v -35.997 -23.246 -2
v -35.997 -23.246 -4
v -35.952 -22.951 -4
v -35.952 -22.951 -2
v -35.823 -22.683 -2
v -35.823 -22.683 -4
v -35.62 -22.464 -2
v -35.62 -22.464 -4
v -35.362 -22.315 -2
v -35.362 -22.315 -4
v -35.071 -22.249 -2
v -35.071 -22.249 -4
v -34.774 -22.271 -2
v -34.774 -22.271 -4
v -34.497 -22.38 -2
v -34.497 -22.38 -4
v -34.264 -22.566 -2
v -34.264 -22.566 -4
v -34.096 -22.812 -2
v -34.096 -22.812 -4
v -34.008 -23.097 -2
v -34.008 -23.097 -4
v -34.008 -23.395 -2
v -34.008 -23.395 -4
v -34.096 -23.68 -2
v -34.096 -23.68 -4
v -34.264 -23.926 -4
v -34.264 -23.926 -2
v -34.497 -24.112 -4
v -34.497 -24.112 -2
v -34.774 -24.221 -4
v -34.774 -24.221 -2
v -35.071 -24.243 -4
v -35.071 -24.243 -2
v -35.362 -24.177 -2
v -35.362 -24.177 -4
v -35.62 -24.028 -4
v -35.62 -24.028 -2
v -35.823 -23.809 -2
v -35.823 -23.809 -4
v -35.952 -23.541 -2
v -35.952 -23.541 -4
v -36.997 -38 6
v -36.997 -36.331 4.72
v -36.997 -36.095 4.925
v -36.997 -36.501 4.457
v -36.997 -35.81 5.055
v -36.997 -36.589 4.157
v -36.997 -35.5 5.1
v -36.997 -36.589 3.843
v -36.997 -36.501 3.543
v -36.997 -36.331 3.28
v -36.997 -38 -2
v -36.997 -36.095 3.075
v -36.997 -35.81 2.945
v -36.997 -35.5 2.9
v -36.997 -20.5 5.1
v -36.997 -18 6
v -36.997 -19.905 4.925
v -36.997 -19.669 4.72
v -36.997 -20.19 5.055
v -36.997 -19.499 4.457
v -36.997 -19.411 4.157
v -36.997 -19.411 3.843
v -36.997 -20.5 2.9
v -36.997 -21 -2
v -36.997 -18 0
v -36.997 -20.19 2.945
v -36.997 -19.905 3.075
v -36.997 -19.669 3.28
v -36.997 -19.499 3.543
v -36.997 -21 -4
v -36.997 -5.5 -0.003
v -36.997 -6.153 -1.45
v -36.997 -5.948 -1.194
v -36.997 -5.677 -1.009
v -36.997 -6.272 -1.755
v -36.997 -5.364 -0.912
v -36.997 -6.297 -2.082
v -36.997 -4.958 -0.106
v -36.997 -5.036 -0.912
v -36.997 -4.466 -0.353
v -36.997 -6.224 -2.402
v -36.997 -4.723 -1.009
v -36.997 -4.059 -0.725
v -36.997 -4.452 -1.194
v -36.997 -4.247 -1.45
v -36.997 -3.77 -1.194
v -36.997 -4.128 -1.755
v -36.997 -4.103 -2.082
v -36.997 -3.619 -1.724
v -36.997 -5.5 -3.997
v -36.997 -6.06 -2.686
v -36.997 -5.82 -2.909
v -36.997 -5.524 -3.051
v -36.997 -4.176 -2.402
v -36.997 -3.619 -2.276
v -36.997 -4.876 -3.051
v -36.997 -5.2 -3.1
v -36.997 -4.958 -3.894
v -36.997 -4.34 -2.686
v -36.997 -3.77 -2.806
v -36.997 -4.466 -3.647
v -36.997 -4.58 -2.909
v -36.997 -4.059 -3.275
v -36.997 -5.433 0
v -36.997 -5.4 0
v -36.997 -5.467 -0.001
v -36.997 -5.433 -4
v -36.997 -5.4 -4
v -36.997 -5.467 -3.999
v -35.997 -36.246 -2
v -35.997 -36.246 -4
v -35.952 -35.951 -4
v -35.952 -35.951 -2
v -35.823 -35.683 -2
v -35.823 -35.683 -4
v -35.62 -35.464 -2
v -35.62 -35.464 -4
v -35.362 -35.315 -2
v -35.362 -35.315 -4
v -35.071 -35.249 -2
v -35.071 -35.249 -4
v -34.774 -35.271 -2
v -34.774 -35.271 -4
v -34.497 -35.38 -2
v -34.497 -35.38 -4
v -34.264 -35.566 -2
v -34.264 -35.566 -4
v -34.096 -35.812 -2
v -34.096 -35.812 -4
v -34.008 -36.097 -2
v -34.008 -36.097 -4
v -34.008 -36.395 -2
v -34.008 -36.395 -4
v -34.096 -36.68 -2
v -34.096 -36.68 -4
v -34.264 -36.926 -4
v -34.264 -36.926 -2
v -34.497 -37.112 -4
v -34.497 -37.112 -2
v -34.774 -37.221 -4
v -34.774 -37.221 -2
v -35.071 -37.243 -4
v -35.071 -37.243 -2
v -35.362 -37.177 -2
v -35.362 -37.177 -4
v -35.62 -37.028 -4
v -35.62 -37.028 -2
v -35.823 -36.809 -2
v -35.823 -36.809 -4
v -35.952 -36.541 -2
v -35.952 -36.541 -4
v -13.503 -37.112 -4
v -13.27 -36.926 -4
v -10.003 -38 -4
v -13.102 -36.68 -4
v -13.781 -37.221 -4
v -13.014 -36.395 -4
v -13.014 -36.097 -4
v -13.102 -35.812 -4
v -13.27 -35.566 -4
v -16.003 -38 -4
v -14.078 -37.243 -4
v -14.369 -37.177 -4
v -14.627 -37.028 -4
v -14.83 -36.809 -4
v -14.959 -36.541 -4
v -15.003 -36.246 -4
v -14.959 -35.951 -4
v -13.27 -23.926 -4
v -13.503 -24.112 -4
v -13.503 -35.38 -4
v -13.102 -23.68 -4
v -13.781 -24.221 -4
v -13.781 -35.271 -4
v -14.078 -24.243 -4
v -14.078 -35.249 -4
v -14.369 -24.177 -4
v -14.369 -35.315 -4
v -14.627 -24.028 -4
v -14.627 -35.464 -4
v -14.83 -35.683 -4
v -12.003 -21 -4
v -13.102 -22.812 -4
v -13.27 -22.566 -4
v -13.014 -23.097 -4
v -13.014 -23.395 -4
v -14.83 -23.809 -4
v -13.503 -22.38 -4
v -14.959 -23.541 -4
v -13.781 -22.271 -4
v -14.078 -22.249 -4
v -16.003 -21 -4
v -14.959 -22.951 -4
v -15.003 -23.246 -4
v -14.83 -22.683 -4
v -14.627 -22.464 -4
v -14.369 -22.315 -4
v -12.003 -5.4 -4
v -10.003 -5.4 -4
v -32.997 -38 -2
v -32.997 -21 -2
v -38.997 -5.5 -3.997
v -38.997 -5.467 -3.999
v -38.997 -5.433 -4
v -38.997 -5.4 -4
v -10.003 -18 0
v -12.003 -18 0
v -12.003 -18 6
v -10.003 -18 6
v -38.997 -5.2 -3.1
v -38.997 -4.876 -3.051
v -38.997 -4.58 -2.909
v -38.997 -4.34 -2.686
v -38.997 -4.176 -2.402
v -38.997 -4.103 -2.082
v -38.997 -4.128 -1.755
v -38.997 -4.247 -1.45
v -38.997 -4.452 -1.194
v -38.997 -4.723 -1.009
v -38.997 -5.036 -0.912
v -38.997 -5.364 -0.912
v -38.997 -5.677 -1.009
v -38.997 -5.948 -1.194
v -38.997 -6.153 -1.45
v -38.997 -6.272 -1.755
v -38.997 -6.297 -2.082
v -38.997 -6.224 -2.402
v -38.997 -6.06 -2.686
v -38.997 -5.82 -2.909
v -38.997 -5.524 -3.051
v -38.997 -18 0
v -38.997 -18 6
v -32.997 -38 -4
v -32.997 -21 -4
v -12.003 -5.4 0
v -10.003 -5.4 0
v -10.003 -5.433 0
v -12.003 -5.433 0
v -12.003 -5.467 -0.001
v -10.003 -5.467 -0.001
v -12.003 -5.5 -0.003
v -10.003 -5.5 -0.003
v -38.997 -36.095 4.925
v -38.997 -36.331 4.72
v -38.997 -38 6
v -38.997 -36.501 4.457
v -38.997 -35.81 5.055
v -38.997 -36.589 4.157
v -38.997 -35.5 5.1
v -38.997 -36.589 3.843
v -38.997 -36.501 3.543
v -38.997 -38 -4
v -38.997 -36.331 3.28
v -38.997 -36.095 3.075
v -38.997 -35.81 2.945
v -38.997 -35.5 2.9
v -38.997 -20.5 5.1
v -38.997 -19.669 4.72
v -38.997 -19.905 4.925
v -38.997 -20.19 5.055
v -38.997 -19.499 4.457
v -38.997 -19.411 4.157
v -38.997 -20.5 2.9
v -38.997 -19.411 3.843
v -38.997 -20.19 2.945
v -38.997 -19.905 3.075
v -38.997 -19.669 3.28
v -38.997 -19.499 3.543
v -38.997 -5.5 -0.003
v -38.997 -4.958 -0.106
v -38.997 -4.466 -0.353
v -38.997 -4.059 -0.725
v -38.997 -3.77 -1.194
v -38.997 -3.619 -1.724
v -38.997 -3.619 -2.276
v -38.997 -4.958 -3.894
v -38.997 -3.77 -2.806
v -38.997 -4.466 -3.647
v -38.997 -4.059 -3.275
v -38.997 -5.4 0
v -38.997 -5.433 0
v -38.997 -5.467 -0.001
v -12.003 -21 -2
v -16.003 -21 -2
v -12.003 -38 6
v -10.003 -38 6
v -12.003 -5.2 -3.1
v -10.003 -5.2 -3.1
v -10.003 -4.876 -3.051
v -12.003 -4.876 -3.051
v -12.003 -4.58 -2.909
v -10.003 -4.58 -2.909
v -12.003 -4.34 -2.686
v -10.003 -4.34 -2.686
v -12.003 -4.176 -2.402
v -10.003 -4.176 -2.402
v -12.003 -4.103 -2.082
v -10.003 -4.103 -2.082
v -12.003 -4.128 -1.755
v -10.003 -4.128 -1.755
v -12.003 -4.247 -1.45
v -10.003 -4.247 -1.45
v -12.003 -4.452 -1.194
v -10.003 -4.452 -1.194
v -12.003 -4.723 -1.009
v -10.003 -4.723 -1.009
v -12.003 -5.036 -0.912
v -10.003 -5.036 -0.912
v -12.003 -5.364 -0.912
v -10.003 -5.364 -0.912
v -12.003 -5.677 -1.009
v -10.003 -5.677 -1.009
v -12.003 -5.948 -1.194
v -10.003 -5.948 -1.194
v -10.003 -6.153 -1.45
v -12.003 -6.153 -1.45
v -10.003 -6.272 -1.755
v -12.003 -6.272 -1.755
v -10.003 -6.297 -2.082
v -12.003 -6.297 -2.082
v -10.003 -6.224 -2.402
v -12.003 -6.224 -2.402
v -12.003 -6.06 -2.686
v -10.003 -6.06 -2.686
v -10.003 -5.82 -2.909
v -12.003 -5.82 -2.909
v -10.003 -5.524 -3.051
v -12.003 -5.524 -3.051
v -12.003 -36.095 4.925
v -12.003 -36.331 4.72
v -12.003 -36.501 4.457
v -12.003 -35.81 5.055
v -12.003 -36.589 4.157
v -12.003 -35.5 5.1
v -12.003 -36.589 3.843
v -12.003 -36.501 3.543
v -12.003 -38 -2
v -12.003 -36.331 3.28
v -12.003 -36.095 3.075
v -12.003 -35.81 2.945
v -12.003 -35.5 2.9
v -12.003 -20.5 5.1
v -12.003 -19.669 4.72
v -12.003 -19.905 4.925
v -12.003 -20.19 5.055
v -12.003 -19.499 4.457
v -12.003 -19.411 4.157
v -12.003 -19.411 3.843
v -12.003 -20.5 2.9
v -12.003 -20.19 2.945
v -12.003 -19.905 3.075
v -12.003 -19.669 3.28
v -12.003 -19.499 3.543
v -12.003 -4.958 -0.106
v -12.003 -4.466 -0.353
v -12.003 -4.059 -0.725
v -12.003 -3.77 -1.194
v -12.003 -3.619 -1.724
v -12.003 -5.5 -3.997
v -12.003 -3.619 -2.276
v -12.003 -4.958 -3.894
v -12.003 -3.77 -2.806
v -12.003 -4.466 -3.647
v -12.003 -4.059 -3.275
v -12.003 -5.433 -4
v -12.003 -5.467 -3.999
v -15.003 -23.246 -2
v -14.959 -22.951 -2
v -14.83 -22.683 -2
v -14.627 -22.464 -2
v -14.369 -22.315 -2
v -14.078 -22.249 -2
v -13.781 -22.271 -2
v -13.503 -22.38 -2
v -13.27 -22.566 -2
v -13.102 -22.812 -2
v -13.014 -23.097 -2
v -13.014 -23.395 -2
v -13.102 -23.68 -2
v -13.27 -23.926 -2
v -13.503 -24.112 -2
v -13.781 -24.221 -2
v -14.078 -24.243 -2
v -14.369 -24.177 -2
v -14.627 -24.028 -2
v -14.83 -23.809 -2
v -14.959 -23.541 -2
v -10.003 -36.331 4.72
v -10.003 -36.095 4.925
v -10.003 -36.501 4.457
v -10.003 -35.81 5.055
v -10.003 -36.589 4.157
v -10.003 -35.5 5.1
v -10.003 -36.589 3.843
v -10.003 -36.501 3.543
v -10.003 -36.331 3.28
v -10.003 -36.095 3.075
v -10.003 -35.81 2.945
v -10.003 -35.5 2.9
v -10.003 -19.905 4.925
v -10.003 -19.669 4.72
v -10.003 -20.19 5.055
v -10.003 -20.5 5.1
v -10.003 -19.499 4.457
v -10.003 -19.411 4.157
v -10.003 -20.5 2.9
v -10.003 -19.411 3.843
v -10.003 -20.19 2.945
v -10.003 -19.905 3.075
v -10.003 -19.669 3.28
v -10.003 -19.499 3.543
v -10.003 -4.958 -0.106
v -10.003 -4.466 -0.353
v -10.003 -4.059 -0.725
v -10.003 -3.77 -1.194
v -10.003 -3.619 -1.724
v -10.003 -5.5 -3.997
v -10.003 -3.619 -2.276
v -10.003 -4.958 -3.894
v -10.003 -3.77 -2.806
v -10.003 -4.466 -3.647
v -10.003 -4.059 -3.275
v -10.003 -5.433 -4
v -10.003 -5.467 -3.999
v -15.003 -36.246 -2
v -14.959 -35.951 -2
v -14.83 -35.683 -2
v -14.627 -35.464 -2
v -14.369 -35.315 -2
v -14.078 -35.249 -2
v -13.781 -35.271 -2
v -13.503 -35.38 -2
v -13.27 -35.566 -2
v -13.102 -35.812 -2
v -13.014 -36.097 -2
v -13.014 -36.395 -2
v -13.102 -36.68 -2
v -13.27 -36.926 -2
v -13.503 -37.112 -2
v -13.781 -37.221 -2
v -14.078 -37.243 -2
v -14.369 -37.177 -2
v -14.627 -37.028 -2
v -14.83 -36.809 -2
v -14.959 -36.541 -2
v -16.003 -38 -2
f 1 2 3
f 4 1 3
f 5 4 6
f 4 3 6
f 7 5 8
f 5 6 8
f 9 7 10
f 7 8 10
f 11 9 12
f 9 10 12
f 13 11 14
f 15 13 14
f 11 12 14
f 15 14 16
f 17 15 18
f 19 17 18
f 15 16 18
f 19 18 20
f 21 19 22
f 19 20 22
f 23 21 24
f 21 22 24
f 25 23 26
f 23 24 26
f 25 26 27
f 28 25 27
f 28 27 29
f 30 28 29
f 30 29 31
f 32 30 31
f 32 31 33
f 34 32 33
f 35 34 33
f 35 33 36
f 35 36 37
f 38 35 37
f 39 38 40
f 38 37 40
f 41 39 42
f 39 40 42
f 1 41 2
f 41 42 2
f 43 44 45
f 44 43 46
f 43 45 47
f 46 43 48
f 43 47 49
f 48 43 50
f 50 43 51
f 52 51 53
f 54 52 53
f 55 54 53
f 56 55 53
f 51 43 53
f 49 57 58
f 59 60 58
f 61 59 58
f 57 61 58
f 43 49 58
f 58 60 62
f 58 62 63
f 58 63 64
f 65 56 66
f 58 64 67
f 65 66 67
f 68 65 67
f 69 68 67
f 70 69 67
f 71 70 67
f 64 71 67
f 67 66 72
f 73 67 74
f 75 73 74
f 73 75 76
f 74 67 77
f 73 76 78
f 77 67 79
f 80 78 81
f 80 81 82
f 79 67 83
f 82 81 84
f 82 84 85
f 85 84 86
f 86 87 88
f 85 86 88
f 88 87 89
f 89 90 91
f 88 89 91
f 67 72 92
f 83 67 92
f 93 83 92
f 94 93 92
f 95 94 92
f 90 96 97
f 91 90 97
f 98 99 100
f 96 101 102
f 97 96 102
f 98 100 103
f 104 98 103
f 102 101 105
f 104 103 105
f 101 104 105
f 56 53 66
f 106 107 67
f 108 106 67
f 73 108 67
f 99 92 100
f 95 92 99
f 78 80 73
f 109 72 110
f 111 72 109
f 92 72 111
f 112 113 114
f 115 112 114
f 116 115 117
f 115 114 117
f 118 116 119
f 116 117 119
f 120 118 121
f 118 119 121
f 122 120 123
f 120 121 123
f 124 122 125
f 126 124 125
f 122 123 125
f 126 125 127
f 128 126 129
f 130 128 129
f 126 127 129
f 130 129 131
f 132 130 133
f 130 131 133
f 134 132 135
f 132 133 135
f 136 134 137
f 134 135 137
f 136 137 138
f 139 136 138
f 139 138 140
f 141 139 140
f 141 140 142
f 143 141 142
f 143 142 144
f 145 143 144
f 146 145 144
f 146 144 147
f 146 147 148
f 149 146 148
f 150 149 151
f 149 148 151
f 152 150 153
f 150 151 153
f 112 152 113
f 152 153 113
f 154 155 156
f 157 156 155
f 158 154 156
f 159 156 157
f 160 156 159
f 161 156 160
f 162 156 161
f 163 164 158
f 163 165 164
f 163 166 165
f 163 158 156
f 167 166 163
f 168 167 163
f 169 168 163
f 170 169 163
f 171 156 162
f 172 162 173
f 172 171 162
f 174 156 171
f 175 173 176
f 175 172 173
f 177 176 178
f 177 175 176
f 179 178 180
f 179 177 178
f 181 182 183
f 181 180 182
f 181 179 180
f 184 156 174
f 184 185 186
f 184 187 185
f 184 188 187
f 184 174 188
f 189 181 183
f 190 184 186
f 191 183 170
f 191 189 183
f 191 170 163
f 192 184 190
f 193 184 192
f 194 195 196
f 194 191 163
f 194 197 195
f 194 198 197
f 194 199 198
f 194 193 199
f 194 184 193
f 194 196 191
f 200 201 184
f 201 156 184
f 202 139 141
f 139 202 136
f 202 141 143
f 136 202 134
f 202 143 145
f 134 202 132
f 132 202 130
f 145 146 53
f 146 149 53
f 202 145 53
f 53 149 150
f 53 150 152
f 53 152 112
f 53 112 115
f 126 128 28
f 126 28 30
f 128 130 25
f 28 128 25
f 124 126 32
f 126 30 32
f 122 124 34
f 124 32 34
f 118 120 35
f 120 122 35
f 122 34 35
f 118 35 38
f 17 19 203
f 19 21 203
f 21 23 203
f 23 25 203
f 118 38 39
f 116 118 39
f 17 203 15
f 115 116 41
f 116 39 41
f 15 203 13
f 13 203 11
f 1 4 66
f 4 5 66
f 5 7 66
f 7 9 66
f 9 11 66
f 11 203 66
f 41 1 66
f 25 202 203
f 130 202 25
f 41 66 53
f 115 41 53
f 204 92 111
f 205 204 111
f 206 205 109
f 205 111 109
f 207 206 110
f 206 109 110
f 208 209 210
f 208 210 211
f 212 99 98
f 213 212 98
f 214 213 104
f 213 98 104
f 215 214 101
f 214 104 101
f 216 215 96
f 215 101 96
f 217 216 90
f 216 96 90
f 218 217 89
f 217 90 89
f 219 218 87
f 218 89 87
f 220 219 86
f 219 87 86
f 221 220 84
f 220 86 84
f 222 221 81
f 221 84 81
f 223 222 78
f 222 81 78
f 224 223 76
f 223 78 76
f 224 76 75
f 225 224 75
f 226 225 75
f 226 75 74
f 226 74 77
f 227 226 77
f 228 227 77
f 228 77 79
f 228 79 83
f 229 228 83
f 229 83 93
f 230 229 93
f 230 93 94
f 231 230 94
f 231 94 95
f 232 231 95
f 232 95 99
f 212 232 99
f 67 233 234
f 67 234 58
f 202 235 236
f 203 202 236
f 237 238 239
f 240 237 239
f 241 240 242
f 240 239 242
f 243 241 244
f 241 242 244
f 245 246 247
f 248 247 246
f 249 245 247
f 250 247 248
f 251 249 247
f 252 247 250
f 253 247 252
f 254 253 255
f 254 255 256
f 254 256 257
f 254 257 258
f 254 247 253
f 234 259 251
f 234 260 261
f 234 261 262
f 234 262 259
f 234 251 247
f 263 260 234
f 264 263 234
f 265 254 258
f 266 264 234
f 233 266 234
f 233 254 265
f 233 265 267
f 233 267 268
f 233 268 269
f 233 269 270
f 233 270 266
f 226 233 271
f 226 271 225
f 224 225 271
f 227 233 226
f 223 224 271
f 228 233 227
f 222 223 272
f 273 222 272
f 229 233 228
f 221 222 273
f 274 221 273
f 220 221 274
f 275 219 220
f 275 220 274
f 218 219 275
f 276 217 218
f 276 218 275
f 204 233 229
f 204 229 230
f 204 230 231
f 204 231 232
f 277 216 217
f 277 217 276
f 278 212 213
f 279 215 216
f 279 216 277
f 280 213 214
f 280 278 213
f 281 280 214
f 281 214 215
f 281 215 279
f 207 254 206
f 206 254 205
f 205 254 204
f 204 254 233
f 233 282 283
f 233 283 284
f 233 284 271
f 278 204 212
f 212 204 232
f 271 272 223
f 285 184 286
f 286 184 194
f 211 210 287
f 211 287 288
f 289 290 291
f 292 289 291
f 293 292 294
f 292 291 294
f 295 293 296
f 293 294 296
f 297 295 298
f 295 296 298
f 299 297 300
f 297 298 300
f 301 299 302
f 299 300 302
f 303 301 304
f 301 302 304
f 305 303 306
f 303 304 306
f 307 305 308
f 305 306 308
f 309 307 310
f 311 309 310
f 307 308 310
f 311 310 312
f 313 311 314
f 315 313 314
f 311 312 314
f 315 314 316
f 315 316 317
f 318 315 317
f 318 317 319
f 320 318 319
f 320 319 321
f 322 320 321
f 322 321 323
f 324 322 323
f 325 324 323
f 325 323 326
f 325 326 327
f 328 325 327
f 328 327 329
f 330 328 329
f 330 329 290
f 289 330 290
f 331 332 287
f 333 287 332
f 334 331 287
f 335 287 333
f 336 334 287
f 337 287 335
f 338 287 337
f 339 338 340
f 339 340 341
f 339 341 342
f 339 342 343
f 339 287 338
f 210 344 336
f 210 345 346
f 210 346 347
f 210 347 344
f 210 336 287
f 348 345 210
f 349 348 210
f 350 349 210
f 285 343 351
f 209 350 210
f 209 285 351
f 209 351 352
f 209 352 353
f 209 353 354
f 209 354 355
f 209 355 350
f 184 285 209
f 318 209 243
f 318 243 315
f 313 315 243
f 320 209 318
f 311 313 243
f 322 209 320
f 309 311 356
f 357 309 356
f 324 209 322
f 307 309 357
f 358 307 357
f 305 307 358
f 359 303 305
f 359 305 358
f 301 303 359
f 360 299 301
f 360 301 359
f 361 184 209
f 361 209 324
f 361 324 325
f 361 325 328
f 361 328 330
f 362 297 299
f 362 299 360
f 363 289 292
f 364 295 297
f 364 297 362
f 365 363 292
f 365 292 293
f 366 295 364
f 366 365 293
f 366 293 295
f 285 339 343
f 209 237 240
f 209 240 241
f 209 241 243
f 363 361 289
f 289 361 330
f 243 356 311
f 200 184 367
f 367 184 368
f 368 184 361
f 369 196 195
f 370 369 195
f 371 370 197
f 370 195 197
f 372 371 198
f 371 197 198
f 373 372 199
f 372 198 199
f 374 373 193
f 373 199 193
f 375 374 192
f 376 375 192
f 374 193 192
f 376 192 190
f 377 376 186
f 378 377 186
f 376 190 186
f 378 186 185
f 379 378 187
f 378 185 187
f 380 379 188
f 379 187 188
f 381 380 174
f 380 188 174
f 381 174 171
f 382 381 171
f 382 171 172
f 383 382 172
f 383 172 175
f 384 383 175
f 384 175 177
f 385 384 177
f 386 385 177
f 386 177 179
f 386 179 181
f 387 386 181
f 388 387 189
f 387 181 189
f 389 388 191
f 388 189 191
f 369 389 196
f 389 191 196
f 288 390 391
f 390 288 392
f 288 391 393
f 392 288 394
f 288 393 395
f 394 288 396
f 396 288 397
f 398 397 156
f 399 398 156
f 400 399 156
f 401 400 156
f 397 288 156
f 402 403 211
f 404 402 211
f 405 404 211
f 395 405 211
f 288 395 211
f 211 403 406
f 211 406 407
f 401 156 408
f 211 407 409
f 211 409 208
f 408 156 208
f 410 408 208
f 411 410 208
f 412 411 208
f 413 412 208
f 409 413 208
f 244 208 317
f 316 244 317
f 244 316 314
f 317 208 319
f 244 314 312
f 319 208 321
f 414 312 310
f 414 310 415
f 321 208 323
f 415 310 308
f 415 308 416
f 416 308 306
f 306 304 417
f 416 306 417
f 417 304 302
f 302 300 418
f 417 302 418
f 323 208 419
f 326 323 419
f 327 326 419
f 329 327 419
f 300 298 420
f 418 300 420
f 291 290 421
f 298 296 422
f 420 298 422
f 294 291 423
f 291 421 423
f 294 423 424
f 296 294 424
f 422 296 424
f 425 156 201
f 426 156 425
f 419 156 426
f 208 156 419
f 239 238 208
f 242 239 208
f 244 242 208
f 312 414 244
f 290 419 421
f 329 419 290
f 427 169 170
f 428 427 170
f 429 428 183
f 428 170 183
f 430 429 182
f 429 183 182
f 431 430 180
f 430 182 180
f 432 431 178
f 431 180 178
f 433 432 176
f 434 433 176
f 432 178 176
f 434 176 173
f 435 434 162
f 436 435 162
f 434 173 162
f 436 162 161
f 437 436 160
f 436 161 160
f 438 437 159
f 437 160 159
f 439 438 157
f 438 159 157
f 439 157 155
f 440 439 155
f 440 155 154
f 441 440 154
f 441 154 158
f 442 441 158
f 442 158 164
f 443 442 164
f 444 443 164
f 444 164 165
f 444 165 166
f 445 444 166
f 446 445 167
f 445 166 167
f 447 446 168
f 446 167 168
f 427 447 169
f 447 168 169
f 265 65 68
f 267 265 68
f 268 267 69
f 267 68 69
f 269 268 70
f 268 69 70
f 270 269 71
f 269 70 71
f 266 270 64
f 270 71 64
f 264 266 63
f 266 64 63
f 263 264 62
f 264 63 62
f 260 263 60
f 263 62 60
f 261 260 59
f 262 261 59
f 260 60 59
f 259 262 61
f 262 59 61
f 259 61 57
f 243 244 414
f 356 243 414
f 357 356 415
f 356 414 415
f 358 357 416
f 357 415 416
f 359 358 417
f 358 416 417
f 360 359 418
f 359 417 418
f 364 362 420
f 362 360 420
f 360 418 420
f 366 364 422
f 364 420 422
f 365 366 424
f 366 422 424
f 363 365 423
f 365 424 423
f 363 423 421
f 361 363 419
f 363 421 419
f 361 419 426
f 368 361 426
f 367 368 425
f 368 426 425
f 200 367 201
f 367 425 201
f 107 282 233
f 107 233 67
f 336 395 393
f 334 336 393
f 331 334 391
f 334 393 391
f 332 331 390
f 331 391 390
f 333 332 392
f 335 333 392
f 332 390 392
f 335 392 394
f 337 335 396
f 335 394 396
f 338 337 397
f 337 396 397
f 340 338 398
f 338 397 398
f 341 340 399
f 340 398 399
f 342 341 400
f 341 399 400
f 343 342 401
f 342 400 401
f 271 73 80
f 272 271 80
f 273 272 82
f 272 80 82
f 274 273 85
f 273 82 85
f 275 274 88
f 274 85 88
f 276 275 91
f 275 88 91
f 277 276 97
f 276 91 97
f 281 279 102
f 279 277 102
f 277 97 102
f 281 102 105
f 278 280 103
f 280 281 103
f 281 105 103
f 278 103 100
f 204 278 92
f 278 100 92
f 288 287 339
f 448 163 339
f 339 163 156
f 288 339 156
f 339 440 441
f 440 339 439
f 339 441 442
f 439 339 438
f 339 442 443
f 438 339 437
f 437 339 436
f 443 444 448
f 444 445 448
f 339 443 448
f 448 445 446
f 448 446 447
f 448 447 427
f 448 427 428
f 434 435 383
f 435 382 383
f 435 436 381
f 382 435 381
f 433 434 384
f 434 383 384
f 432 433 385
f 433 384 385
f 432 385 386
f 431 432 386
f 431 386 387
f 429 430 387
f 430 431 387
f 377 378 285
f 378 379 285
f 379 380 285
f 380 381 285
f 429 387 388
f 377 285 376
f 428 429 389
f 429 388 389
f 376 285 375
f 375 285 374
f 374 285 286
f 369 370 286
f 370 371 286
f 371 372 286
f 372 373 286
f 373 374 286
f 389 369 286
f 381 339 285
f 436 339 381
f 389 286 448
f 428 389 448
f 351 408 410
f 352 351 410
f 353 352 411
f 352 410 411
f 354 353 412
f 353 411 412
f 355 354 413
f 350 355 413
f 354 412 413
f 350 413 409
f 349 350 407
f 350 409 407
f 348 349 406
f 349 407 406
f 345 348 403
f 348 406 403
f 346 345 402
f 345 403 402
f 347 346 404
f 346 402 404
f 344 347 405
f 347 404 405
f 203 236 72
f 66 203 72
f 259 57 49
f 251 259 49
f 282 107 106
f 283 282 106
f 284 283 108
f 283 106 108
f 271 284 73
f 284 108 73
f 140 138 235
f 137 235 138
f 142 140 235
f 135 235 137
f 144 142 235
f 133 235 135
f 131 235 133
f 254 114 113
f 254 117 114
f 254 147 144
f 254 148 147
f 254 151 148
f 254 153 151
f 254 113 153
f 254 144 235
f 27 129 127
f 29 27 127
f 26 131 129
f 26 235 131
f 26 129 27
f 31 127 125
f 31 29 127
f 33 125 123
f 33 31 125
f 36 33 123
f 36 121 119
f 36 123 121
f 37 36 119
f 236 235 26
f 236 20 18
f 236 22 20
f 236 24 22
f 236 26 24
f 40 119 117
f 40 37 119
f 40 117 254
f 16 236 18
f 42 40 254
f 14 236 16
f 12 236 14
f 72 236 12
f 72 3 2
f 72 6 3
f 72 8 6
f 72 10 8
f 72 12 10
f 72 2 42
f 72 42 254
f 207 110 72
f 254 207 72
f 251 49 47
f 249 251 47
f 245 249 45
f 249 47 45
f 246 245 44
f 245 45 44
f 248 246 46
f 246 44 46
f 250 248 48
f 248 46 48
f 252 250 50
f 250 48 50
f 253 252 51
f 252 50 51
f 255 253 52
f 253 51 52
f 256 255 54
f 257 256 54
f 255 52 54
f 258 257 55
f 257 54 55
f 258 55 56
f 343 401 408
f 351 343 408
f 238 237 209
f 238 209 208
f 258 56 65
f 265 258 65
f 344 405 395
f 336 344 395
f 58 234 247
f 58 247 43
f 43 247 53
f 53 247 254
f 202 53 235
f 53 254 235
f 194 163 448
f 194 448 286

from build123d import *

# Parameters (mm, degrees)
SKETCH_1_W          = 2
SKETCH_1_H          = 35
EXTRUDE_1_DEPTH     = 4
EXTRUDE_1_2_DEPTH   = 4
SKETCH_2_W          = 4
SKETCH_2_H          = 17
EXTRUDE_2_DEPTH     = 2
SKETCH_3_R          = 1
CUT_EXTRUDE_1_DEPTH = 2
SKETCH_5_W          = 2
SKETCH_5_H          = 20
EXTRUDE_3_DEPTH     = 6
CUT_EXTRUDE_2_DEPTH = 29.99338081
CUT_EXTRUDE_3_DEPTH = 29.99338081
CUT_EXTRUDE_4_DEPTH = 29.99338081
SKETCH_9_R          = 1.1
CUT_EXTRUDE_5_DEPTH = 29.99338081


with BuildPart() as part:
    # 草图1 → 凸台-拉伸1 (new body)
    with BuildSketch(Plane.XY):
        with Locations((-37.996690405, -20.5)):
            Rectangle(SKETCH_1_W, SKETCH_1_H)
    extrude(amount=-EXTRUDE_1_DEPTH)



with BuildPart() as body_2:
    # 草图1 → Extrude 1 2 (new body)
    with BuildSketch(Plane.XY):
        with Locations((-11.003309595, -20.5)):
            Rectangle(SKETCH_1_W, SKETCH_1_H)
    extrude(amount=-EXTRUDE_1_2_DEPTH)


with BuildPart() as part_1:
    add(part.part)

    add(body_2.part)  # 凸台-拉伸2 merges body 2
    # 草图2 → 凸台-拉伸2 (add)
    with BuildSketch(Plane(origin=(0, 0, -4), x_dir=(-1, 0, 0), z_dir=(0, 0, -1))):
        with Locations((34.996690405, -29.5)):
            Rectangle(SKETCH_2_W, SKETCH_2_H)
        with Locations((14.003309595, -29.5)):
            Rectangle(SKETCH_2_W, SKETCH_2_H)
    extrude(amount=-EXTRUDE_2_DEPTH)

    # 草图3 → 切除-拉伸1 (cut)
    with BuildSketch(Plane(origin=(0, 0, -4), x_dir=(-1, 0, 0), z_dir=(0, 0, -1))):
        with Locations((34.996690405, -36.24616654)):
            Circle(SKETCH_3_R)
        with Locations((34.996690405, -23.24616654)):
            Circle(SKETCH_3_R)
        with Locations((14.003309595, -36.24616654)):
            Circle(SKETCH_3_R)
        with Locations((14.003309595, -23.24616654)):
            Circle(SKETCH_3_R)
    extrude(amount=-CUT_EXTRUDE_1_DEPTH, mode=Mode.SUBTRACT)

    # 草图5 → 凸台-拉伸3 (add)
    with BuildSketch(Plane.XY):
        with Locations((-11.003309595, -28)):
            Rectangle(SKETCH_5_W, SKETCH_5_H)
        with Locations((-37.996690405, -28)):
            Rectangle(SKETCH_5_W, SKETCH_5_H)
    extrude(amount=EXTRUDE_3_DEPTH)

    # 草图6 → 切除-拉伸2 (cut, through all)
    with BuildSketch(Plane(origin=(-10.003309595, 0, 0), x_dir=(0, 0, -1), z_dir=(1, 0, 0))):
        with BuildLine():
            Line((-5.1, -20.5), (-5.1, -35.5))
            ThreePointArc((-5.1, -35.5), (-4, -36.6), (-2.9, -35.5))
            Line((-2.9, -35.5), (-2.9, -20.5))
            ThreePointArc((-2.9, -20.5), (-4, -19.4), (-5.1, -20.5))
        make_face()
    extrude(amount=-CUT_EXTRUDE_2_DEPTH, mode=Mode.SUBTRACT)

    # 草图7 → 切除-拉伸3 (cut, through all)
    with BuildSketch(Plane(origin=(-10.003309595, 0, 0), x_dir=(0, 0, -1), z_dir=(1, 0, 0))):
        with BuildLine():
            Line((4, -3), (0, -3))
            Line((0, -3), (0, -5.4))
            ThreePointArc((0, -5.4), (2, -3.4), (4, -5.4))
            Line((4, -5.4), (4, -3))
        make_face()
    extrude(amount=-CUT_EXTRUDE_3_DEPTH, mode=Mode.SUBTRACT)

    # 草图8 → 切除-拉伸4 (cut, through all)
    with BuildSketch(Plane(origin=(-10.003309595, 0, 0), x_dir=(0, 0, -1), z_dir=(1, 0, 0))):
        with BuildLine():
            ThreePointArc((4, -5.4), (2, -3.4), (0, -5.4))
            ThreePointArc((0, -5.4), (0.000625489, -5.450015642), (0.002501564, -5.5))
            ThreePointArc((0.002501564, -5.5), (2, -3.6), (3.997498436, -5.5))
            ThreePointArc((3.997498436, -5.5), (3.999374511, -5.450015642), (4, -5.4))
        make_face()
    extrude(amount=-CUT_EXTRUDE_4_DEPTH, mode=Mode.SUBTRACT)

    # 草图9 → 切除-拉伸5 (cut, through all)
    with BuildSketch(Plane(origin=(-10.003309595, 0, 0), x_dir=(0, 0, -1), z_dir=(1, 0, 0))):
        with Locations((2, -5.2)):
            Circle(SKETCH_9_R)
    extrude(amount=-CUT_EXTRUDE_5_DEPTH, mode=Mode.SUBTRACT)


solid = part_1.part
